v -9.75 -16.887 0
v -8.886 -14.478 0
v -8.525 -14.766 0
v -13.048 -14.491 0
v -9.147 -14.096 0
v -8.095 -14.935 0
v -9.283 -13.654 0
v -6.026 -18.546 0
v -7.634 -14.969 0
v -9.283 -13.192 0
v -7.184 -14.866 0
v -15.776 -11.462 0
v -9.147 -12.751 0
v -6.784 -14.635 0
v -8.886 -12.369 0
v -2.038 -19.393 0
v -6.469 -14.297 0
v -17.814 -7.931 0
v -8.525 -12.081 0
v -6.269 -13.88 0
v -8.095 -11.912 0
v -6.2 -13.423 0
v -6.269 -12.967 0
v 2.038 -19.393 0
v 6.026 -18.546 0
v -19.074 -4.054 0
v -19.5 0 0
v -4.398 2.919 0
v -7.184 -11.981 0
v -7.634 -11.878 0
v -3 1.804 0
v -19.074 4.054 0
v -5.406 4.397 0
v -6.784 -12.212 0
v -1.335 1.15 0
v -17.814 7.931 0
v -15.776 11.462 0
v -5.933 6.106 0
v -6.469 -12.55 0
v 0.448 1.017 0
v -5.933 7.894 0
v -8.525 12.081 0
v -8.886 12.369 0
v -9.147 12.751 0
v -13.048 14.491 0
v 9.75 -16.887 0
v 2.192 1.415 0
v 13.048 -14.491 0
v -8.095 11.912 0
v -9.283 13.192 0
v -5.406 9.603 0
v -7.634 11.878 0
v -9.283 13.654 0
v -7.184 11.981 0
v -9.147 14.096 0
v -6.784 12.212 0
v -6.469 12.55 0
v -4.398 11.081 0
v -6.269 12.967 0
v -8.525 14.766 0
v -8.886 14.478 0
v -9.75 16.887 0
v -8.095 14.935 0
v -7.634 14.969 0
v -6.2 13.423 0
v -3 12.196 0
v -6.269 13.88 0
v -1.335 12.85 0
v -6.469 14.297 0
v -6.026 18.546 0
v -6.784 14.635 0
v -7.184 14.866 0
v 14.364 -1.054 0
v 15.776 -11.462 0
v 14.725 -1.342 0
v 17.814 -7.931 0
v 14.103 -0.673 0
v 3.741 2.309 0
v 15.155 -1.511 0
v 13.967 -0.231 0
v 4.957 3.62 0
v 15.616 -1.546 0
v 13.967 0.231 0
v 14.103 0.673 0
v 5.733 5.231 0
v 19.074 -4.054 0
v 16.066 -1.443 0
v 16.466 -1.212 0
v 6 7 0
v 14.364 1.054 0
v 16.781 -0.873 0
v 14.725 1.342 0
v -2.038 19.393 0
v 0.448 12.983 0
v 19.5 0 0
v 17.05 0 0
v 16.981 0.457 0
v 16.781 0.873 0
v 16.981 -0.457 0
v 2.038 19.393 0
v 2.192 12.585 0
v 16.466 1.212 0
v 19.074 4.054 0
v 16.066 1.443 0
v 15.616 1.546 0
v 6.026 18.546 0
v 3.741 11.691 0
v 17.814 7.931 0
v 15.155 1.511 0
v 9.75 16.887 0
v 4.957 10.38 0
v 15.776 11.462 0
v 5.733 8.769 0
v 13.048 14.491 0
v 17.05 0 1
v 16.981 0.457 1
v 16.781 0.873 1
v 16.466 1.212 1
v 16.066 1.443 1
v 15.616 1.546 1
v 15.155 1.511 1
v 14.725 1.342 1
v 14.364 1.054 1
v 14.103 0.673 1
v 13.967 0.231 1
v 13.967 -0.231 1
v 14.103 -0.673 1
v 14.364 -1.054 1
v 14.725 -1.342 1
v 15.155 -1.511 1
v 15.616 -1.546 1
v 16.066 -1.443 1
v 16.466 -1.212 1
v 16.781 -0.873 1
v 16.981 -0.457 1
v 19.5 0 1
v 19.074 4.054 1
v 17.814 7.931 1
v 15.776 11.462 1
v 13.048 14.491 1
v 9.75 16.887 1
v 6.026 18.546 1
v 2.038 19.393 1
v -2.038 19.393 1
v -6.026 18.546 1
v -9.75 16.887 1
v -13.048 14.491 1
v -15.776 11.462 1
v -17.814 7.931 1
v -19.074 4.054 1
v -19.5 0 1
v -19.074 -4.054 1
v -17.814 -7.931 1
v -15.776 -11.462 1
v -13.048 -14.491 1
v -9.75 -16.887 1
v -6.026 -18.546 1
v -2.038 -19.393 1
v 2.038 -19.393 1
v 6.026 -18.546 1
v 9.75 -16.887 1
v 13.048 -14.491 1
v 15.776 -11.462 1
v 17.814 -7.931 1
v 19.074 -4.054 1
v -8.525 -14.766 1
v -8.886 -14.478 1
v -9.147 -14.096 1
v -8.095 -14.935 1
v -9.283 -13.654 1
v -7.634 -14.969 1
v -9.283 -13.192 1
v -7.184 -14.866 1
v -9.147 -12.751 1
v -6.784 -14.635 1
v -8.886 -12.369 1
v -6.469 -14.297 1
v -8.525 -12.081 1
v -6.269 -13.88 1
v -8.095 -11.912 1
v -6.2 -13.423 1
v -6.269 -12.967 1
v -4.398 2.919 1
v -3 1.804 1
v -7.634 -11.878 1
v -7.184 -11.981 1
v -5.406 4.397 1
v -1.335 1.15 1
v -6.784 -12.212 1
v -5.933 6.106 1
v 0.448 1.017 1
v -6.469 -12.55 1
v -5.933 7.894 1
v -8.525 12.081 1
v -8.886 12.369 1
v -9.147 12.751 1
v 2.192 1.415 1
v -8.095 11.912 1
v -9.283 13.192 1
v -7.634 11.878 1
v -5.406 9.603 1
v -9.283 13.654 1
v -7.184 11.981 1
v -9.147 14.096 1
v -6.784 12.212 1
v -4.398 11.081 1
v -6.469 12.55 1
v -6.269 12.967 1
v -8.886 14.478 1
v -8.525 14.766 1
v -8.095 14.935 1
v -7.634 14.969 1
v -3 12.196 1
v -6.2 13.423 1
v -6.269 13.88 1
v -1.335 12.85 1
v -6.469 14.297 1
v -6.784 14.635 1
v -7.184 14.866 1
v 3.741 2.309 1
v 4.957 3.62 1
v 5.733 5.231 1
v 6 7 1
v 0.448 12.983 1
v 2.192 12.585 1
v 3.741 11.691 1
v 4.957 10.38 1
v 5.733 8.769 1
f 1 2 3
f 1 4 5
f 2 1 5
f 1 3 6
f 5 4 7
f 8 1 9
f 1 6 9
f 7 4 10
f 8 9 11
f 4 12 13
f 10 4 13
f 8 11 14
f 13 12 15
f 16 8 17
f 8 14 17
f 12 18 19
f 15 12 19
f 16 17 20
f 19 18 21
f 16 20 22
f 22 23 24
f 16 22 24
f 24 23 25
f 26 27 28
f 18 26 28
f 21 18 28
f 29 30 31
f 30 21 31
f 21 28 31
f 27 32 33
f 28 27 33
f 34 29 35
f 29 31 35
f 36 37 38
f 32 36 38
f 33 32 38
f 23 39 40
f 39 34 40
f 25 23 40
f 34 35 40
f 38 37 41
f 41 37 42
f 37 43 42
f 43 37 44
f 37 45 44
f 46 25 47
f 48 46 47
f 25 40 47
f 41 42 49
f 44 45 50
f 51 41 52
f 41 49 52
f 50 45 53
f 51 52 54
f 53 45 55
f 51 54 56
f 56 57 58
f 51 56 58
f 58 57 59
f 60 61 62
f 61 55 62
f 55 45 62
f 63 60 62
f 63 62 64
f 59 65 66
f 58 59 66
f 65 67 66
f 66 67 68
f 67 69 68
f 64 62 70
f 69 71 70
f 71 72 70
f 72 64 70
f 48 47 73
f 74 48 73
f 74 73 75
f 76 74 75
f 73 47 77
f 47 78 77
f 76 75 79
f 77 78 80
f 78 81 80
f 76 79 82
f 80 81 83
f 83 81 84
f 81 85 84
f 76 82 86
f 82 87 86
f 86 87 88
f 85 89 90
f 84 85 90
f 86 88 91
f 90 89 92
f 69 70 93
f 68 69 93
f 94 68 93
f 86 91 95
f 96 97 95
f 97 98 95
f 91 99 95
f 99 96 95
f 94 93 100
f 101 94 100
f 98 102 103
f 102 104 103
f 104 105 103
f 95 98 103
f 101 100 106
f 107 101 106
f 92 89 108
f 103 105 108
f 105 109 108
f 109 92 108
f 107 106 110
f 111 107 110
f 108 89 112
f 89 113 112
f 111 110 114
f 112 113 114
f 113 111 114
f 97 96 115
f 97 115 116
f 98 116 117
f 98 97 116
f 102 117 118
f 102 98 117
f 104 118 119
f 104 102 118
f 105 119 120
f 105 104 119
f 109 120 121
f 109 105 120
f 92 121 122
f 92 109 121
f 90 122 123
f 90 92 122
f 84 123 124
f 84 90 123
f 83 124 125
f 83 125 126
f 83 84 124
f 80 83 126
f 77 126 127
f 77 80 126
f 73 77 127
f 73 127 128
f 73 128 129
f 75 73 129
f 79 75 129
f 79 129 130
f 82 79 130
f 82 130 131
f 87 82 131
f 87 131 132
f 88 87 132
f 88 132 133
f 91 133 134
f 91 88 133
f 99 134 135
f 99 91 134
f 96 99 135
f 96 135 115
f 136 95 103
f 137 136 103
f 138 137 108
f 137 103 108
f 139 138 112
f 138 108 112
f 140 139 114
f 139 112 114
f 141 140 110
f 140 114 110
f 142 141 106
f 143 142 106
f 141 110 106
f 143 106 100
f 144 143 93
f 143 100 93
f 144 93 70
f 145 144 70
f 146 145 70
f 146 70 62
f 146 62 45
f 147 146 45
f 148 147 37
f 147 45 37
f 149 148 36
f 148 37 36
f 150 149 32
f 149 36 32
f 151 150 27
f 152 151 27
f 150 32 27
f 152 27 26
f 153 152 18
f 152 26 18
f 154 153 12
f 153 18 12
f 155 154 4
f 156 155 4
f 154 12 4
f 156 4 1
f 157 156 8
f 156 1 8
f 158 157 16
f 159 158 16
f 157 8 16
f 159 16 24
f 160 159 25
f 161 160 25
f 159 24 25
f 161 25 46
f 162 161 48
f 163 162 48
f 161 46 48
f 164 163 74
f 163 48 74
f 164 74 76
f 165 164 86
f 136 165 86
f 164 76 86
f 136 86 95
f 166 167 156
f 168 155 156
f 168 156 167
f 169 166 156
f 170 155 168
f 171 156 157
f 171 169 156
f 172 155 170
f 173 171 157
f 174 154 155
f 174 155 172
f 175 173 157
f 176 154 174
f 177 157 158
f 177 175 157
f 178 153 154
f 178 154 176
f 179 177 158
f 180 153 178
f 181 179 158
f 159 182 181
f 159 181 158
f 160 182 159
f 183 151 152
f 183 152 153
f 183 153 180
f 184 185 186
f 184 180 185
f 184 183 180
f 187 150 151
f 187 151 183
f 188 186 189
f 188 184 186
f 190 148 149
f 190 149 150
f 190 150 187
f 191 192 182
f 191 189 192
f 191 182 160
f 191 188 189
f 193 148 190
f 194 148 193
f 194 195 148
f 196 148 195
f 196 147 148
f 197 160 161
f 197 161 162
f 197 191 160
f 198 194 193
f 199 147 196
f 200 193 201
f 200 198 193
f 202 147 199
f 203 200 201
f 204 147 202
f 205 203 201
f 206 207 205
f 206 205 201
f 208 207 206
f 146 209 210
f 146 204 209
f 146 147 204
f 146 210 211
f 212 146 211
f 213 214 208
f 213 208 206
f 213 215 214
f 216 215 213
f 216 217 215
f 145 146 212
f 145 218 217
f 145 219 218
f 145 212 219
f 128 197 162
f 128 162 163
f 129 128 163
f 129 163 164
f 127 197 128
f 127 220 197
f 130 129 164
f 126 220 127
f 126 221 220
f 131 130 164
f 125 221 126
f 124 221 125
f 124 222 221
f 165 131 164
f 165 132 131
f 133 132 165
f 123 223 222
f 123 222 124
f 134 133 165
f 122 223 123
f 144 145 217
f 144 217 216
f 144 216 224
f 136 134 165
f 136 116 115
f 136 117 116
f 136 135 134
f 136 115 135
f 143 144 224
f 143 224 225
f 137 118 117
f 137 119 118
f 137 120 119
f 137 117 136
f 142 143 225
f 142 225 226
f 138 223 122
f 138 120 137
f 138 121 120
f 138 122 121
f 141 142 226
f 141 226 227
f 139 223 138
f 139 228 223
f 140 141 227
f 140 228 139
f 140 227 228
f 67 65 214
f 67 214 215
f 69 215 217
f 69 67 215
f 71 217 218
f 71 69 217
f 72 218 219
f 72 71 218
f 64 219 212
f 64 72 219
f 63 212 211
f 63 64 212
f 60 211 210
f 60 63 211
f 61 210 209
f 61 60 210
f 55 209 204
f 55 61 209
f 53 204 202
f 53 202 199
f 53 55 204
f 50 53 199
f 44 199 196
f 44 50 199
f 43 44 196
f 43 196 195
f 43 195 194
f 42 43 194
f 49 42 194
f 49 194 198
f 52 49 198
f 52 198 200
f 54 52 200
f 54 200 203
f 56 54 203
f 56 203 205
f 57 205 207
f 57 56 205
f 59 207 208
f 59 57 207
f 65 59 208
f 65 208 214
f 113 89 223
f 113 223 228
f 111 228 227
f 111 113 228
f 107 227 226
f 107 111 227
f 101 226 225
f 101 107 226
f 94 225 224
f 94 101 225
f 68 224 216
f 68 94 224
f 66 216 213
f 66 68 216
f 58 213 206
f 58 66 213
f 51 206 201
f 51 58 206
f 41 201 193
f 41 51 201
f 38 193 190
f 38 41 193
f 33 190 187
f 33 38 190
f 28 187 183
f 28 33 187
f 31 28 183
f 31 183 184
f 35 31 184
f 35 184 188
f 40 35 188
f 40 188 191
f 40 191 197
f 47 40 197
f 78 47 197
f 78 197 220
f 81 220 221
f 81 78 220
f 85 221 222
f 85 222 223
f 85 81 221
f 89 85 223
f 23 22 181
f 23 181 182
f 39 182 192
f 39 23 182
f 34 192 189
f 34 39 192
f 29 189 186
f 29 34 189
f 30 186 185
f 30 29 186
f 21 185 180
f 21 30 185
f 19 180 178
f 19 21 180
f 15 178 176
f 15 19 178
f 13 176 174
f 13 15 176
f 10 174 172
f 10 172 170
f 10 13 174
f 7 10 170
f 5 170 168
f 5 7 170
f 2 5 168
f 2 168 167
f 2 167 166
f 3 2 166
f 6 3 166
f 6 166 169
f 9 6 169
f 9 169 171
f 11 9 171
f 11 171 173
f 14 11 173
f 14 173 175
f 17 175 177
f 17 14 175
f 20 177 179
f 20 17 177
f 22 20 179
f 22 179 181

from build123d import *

# Parameters (mm, degrees)
F0_R     = 19.5
F0_R_2   = 1.55
F0_R_3   = 6
F1_DEPTH = 1


with BuildPart() as f1:
    # F0 (on Top) → F1 (new body)
    with BuildSketch(Plane.XY):
        Circle(F0_R)
        with Locations((-7.75, -13.423394)):
            Circle(F0_R_2, mode=Mode.SUBTRACT)
        with Locations((-7.75, 13.423394)):
            Circle(F0_R_2, mode=Mode.SUBTRACT)
        with Locations((0, 7)):
            Circle(F0_R_3, mode=Mode.SUBTRACT)
        with Locations((15.5, 0)):
            Circle(F0_R_2, mode=Mode.SUBTRACT)
    extrude(amount=F1_DEPTH)


solid = f1.part
